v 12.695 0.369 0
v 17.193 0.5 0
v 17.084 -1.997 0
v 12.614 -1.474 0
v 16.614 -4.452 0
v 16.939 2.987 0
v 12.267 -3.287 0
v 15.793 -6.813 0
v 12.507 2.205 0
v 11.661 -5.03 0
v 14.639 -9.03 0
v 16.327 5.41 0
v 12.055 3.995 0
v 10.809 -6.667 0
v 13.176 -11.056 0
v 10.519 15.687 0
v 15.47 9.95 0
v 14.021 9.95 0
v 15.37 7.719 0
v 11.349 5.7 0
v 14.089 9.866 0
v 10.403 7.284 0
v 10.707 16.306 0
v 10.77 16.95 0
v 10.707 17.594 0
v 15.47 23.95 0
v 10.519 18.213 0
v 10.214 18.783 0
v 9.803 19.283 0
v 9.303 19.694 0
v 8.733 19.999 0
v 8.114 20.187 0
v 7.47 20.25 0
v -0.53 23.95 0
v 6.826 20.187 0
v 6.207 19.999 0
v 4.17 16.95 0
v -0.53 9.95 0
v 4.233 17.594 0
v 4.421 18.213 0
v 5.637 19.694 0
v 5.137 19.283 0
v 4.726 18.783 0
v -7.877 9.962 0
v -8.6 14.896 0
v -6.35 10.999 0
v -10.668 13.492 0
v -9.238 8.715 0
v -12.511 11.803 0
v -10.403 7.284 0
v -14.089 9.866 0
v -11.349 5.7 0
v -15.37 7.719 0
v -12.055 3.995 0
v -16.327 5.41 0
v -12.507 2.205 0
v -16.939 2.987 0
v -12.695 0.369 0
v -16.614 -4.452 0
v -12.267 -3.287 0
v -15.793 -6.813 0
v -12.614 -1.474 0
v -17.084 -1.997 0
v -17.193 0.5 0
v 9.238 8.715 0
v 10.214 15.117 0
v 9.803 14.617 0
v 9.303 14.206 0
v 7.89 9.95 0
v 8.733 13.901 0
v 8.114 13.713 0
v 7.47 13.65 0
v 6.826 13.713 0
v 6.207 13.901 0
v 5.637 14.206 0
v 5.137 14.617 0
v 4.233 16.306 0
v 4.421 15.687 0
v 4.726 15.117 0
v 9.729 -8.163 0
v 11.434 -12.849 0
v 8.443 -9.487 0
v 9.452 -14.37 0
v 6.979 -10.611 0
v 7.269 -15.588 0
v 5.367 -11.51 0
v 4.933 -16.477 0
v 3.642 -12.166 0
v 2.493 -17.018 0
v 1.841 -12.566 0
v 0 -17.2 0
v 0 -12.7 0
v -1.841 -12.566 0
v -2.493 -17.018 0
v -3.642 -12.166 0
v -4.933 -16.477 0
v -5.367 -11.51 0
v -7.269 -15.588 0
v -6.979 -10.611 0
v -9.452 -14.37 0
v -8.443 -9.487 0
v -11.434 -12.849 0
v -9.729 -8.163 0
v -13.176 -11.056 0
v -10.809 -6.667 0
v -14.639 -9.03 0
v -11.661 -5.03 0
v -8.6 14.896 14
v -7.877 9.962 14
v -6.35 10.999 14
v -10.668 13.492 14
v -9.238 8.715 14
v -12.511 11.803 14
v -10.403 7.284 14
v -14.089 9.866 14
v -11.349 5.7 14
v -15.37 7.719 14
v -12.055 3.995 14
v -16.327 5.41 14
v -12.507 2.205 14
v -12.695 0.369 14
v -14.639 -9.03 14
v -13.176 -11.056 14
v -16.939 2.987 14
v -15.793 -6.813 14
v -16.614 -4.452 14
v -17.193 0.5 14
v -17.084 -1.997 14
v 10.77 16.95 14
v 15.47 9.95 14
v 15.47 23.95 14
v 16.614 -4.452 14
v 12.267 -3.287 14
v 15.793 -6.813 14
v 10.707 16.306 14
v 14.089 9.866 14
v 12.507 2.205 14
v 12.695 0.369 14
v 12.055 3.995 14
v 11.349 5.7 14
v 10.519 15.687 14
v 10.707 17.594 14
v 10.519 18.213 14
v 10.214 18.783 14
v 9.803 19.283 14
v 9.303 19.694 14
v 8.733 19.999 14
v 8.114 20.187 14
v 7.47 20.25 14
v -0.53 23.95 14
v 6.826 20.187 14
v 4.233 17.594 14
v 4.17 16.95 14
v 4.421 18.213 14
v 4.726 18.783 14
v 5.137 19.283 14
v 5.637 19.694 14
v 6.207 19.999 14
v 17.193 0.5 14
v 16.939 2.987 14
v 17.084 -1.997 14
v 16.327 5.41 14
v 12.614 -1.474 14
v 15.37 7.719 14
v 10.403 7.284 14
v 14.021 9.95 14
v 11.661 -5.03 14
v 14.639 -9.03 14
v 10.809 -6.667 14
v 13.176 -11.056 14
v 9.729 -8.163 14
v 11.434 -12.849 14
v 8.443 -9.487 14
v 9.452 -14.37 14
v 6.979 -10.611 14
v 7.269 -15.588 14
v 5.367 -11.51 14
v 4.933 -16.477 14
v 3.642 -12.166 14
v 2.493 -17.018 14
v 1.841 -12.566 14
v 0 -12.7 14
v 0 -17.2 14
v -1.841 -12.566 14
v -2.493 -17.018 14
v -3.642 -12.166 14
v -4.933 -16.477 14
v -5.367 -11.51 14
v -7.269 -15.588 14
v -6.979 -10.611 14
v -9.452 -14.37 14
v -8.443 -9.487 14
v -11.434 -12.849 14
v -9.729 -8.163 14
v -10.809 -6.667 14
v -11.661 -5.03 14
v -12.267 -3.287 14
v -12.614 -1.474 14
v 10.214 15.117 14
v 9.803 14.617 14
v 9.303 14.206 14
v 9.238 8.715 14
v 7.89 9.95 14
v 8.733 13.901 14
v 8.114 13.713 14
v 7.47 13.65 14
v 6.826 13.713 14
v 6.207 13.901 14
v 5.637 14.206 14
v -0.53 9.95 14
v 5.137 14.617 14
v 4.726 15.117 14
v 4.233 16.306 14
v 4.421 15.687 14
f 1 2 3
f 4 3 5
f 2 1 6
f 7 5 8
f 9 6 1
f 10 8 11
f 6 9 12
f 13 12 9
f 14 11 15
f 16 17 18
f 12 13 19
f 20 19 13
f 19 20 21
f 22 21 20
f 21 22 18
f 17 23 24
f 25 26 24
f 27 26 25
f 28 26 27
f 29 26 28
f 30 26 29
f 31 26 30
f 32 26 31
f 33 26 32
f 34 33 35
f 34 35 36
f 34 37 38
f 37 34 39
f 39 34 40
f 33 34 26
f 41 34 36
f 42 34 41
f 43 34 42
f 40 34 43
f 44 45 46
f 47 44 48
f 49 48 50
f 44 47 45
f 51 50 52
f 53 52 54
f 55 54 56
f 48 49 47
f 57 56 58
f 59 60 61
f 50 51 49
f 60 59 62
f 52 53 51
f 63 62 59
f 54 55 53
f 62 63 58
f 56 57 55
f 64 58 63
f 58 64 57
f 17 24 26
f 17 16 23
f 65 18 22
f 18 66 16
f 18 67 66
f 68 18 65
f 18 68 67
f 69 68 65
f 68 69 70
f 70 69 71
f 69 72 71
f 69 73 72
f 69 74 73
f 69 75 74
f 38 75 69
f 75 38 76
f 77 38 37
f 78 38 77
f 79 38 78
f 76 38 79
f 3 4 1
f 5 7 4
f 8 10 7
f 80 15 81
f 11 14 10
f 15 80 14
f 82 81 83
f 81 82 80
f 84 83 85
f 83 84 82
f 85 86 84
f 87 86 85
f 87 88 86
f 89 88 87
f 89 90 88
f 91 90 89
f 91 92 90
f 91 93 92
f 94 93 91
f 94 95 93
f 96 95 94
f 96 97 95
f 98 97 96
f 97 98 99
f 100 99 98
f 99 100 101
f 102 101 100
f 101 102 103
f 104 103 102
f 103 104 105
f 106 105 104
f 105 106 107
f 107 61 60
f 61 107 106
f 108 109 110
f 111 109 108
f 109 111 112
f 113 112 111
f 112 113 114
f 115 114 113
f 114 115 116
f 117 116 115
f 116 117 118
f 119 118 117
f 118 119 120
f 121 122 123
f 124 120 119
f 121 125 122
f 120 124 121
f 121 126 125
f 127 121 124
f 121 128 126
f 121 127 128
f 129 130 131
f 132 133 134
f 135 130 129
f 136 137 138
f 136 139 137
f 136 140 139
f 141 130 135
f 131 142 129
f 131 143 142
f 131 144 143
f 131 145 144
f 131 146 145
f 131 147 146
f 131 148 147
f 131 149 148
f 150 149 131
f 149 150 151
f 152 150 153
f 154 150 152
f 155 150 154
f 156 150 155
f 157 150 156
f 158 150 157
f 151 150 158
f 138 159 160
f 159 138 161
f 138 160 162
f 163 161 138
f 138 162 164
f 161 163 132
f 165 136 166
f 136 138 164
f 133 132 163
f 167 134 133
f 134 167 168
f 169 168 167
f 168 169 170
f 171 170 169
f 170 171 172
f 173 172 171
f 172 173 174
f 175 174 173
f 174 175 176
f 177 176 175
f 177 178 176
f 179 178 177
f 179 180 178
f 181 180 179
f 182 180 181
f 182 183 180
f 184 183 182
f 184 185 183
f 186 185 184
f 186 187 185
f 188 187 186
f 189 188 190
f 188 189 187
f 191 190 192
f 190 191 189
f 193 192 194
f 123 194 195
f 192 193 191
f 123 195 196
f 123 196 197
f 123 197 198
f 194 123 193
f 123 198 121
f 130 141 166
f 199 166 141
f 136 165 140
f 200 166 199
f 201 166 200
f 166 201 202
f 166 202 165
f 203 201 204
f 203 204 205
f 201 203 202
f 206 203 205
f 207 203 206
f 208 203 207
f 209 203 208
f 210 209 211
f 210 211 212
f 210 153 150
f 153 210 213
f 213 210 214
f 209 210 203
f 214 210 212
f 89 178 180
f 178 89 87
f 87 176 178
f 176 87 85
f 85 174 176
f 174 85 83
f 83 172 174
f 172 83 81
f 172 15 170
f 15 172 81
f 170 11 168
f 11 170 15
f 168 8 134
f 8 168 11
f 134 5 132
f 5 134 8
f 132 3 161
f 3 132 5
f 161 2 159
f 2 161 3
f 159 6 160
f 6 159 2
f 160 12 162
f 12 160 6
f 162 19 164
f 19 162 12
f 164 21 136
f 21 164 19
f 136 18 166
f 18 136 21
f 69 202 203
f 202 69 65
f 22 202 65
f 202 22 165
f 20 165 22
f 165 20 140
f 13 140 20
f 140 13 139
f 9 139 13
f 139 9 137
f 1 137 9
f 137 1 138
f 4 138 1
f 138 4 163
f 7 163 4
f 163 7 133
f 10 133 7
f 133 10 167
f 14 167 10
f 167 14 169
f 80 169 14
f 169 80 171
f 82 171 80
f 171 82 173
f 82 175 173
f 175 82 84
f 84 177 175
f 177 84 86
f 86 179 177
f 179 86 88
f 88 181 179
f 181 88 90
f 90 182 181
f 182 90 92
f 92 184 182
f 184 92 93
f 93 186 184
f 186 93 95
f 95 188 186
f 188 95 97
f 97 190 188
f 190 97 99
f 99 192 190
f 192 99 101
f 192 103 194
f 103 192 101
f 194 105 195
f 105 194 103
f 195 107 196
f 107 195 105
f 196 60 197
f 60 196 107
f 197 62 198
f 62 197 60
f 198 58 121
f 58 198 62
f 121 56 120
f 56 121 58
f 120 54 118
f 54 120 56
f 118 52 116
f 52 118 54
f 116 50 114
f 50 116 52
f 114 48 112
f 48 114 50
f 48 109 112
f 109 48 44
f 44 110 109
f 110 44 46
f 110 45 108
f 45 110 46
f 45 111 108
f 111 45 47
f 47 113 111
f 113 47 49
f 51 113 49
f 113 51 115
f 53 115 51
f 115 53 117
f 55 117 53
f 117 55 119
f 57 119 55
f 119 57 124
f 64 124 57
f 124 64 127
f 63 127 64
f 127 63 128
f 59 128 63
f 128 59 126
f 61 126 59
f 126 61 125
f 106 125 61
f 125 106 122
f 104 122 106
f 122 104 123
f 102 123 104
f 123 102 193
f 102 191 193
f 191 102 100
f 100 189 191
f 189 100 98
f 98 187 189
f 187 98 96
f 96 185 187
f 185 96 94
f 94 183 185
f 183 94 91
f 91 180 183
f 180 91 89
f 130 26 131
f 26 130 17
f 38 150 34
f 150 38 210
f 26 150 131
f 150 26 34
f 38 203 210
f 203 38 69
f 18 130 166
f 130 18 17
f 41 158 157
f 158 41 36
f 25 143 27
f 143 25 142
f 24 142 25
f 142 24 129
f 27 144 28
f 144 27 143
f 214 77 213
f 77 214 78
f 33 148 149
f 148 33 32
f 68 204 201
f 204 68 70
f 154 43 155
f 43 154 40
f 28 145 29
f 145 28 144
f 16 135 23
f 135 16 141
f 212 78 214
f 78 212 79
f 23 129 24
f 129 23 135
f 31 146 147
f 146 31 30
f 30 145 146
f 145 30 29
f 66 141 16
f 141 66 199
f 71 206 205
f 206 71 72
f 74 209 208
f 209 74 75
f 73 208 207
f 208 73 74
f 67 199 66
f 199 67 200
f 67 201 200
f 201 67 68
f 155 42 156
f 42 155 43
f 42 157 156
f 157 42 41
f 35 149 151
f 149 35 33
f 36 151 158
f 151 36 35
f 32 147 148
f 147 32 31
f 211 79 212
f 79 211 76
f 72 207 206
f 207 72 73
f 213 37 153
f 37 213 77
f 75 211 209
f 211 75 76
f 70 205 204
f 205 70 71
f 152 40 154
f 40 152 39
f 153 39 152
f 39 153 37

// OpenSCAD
$fn = 32;

// ----------------------------------------------------------------------
// Pipe clamp: 34.4 mm ring, 4.5 mm wall, 14 mm wide
// ----------------------------------------------------------------------

// --- parameters (mm) ---
outer_r = 17.2;           // clamp outside radius
inner_r = 12.7;           // pipe bore radius
band = 4.5;               // band thickness
clamp_w = 14;             // clamp width
opening = 60;             // opening angle between the ends
lug_w = 16;               // lug width
lug_len = 14;             // lug length
bolt_d = 6.6;             // bolt hole

clamp_profile = [[-8.6, 14.896], [-10.668, 13.492], [-12.511, 11.803], [-14.089, 9.866], [-15.37, 7.719], [-16.327, 5.41], [-16.939, 2.987], [-17.193, 0.5], [-17.084, -1.997], [-16.614, -4.452], [-15.793, -6.813], [-14.639, -9.03], [-13.176, -11.056], [-11.434, -12.849], [-9.452, -14.37], [-7.269, -15.588], [-4.933, -16.477], [-2.493, -17.018], [0, -17.2], [2.493, -17.018], [4.933, -16.477], [7.269, -15.588], [9.452, -14.37], [11.434, -12.849], [13.176, -11.056], [14.639, -9.03], [15.793, -6.813], [16.614, -4.452], [17.084, -1.997], [17.193, 0.5], [16.939, 2.987], [16.327, 5.41], [15.37, 7.719], [14.089, 9.866], [12.511, 11.803], [10.668, 13.492], [8.6, 14.896], [6.35, 10.999], [7.877, 9.962], [9.238, 8.715], [10.403, 7.284], [11.349, 5.7], [12.055, 3.995], [12.507, 2.205], [12.695, 0.369], [12.614, -1.474], [12.267, -3.287], [11.661, -5.03], [10.809, -6.667], [9.729, -8.163], [8.443, -9.487], [6.979, -10.611], [5.367, -11.51], [3.642, -12.166], [1.841, -12.566], [0, -12.7], [-1.841, -12.566], [-3.642, -12.166], [-5.367, -11.51], [-6.979, -10.611], [-8.443, -9.487], [-9.729, -8.163], [-10.809, -6.667], [-11.661, -5.03], [-12.267, -3.287], [-12.614, -1.474], [-12.695, 0.369], [-12.507, 2.205], [-12.055, 3.995], [-11.349, 5.7], [-10.403, 7.284], [-9.238, 8.715], [-7.877, 9.962], [-6.35, 10.999]];

difference() {
  union() {
    linear_extrude(height = clamp_w) polygon(clamp_profile);
    /* bolt lug on the other end */
    translate([-0.53, 9.95, 0]) cube([lug_w, 14, clamp_w]);
  }
  translate([7.47, 16.95, -2.5]) cylinder(h = clamp_w + 5, d = bolt_d);
}
